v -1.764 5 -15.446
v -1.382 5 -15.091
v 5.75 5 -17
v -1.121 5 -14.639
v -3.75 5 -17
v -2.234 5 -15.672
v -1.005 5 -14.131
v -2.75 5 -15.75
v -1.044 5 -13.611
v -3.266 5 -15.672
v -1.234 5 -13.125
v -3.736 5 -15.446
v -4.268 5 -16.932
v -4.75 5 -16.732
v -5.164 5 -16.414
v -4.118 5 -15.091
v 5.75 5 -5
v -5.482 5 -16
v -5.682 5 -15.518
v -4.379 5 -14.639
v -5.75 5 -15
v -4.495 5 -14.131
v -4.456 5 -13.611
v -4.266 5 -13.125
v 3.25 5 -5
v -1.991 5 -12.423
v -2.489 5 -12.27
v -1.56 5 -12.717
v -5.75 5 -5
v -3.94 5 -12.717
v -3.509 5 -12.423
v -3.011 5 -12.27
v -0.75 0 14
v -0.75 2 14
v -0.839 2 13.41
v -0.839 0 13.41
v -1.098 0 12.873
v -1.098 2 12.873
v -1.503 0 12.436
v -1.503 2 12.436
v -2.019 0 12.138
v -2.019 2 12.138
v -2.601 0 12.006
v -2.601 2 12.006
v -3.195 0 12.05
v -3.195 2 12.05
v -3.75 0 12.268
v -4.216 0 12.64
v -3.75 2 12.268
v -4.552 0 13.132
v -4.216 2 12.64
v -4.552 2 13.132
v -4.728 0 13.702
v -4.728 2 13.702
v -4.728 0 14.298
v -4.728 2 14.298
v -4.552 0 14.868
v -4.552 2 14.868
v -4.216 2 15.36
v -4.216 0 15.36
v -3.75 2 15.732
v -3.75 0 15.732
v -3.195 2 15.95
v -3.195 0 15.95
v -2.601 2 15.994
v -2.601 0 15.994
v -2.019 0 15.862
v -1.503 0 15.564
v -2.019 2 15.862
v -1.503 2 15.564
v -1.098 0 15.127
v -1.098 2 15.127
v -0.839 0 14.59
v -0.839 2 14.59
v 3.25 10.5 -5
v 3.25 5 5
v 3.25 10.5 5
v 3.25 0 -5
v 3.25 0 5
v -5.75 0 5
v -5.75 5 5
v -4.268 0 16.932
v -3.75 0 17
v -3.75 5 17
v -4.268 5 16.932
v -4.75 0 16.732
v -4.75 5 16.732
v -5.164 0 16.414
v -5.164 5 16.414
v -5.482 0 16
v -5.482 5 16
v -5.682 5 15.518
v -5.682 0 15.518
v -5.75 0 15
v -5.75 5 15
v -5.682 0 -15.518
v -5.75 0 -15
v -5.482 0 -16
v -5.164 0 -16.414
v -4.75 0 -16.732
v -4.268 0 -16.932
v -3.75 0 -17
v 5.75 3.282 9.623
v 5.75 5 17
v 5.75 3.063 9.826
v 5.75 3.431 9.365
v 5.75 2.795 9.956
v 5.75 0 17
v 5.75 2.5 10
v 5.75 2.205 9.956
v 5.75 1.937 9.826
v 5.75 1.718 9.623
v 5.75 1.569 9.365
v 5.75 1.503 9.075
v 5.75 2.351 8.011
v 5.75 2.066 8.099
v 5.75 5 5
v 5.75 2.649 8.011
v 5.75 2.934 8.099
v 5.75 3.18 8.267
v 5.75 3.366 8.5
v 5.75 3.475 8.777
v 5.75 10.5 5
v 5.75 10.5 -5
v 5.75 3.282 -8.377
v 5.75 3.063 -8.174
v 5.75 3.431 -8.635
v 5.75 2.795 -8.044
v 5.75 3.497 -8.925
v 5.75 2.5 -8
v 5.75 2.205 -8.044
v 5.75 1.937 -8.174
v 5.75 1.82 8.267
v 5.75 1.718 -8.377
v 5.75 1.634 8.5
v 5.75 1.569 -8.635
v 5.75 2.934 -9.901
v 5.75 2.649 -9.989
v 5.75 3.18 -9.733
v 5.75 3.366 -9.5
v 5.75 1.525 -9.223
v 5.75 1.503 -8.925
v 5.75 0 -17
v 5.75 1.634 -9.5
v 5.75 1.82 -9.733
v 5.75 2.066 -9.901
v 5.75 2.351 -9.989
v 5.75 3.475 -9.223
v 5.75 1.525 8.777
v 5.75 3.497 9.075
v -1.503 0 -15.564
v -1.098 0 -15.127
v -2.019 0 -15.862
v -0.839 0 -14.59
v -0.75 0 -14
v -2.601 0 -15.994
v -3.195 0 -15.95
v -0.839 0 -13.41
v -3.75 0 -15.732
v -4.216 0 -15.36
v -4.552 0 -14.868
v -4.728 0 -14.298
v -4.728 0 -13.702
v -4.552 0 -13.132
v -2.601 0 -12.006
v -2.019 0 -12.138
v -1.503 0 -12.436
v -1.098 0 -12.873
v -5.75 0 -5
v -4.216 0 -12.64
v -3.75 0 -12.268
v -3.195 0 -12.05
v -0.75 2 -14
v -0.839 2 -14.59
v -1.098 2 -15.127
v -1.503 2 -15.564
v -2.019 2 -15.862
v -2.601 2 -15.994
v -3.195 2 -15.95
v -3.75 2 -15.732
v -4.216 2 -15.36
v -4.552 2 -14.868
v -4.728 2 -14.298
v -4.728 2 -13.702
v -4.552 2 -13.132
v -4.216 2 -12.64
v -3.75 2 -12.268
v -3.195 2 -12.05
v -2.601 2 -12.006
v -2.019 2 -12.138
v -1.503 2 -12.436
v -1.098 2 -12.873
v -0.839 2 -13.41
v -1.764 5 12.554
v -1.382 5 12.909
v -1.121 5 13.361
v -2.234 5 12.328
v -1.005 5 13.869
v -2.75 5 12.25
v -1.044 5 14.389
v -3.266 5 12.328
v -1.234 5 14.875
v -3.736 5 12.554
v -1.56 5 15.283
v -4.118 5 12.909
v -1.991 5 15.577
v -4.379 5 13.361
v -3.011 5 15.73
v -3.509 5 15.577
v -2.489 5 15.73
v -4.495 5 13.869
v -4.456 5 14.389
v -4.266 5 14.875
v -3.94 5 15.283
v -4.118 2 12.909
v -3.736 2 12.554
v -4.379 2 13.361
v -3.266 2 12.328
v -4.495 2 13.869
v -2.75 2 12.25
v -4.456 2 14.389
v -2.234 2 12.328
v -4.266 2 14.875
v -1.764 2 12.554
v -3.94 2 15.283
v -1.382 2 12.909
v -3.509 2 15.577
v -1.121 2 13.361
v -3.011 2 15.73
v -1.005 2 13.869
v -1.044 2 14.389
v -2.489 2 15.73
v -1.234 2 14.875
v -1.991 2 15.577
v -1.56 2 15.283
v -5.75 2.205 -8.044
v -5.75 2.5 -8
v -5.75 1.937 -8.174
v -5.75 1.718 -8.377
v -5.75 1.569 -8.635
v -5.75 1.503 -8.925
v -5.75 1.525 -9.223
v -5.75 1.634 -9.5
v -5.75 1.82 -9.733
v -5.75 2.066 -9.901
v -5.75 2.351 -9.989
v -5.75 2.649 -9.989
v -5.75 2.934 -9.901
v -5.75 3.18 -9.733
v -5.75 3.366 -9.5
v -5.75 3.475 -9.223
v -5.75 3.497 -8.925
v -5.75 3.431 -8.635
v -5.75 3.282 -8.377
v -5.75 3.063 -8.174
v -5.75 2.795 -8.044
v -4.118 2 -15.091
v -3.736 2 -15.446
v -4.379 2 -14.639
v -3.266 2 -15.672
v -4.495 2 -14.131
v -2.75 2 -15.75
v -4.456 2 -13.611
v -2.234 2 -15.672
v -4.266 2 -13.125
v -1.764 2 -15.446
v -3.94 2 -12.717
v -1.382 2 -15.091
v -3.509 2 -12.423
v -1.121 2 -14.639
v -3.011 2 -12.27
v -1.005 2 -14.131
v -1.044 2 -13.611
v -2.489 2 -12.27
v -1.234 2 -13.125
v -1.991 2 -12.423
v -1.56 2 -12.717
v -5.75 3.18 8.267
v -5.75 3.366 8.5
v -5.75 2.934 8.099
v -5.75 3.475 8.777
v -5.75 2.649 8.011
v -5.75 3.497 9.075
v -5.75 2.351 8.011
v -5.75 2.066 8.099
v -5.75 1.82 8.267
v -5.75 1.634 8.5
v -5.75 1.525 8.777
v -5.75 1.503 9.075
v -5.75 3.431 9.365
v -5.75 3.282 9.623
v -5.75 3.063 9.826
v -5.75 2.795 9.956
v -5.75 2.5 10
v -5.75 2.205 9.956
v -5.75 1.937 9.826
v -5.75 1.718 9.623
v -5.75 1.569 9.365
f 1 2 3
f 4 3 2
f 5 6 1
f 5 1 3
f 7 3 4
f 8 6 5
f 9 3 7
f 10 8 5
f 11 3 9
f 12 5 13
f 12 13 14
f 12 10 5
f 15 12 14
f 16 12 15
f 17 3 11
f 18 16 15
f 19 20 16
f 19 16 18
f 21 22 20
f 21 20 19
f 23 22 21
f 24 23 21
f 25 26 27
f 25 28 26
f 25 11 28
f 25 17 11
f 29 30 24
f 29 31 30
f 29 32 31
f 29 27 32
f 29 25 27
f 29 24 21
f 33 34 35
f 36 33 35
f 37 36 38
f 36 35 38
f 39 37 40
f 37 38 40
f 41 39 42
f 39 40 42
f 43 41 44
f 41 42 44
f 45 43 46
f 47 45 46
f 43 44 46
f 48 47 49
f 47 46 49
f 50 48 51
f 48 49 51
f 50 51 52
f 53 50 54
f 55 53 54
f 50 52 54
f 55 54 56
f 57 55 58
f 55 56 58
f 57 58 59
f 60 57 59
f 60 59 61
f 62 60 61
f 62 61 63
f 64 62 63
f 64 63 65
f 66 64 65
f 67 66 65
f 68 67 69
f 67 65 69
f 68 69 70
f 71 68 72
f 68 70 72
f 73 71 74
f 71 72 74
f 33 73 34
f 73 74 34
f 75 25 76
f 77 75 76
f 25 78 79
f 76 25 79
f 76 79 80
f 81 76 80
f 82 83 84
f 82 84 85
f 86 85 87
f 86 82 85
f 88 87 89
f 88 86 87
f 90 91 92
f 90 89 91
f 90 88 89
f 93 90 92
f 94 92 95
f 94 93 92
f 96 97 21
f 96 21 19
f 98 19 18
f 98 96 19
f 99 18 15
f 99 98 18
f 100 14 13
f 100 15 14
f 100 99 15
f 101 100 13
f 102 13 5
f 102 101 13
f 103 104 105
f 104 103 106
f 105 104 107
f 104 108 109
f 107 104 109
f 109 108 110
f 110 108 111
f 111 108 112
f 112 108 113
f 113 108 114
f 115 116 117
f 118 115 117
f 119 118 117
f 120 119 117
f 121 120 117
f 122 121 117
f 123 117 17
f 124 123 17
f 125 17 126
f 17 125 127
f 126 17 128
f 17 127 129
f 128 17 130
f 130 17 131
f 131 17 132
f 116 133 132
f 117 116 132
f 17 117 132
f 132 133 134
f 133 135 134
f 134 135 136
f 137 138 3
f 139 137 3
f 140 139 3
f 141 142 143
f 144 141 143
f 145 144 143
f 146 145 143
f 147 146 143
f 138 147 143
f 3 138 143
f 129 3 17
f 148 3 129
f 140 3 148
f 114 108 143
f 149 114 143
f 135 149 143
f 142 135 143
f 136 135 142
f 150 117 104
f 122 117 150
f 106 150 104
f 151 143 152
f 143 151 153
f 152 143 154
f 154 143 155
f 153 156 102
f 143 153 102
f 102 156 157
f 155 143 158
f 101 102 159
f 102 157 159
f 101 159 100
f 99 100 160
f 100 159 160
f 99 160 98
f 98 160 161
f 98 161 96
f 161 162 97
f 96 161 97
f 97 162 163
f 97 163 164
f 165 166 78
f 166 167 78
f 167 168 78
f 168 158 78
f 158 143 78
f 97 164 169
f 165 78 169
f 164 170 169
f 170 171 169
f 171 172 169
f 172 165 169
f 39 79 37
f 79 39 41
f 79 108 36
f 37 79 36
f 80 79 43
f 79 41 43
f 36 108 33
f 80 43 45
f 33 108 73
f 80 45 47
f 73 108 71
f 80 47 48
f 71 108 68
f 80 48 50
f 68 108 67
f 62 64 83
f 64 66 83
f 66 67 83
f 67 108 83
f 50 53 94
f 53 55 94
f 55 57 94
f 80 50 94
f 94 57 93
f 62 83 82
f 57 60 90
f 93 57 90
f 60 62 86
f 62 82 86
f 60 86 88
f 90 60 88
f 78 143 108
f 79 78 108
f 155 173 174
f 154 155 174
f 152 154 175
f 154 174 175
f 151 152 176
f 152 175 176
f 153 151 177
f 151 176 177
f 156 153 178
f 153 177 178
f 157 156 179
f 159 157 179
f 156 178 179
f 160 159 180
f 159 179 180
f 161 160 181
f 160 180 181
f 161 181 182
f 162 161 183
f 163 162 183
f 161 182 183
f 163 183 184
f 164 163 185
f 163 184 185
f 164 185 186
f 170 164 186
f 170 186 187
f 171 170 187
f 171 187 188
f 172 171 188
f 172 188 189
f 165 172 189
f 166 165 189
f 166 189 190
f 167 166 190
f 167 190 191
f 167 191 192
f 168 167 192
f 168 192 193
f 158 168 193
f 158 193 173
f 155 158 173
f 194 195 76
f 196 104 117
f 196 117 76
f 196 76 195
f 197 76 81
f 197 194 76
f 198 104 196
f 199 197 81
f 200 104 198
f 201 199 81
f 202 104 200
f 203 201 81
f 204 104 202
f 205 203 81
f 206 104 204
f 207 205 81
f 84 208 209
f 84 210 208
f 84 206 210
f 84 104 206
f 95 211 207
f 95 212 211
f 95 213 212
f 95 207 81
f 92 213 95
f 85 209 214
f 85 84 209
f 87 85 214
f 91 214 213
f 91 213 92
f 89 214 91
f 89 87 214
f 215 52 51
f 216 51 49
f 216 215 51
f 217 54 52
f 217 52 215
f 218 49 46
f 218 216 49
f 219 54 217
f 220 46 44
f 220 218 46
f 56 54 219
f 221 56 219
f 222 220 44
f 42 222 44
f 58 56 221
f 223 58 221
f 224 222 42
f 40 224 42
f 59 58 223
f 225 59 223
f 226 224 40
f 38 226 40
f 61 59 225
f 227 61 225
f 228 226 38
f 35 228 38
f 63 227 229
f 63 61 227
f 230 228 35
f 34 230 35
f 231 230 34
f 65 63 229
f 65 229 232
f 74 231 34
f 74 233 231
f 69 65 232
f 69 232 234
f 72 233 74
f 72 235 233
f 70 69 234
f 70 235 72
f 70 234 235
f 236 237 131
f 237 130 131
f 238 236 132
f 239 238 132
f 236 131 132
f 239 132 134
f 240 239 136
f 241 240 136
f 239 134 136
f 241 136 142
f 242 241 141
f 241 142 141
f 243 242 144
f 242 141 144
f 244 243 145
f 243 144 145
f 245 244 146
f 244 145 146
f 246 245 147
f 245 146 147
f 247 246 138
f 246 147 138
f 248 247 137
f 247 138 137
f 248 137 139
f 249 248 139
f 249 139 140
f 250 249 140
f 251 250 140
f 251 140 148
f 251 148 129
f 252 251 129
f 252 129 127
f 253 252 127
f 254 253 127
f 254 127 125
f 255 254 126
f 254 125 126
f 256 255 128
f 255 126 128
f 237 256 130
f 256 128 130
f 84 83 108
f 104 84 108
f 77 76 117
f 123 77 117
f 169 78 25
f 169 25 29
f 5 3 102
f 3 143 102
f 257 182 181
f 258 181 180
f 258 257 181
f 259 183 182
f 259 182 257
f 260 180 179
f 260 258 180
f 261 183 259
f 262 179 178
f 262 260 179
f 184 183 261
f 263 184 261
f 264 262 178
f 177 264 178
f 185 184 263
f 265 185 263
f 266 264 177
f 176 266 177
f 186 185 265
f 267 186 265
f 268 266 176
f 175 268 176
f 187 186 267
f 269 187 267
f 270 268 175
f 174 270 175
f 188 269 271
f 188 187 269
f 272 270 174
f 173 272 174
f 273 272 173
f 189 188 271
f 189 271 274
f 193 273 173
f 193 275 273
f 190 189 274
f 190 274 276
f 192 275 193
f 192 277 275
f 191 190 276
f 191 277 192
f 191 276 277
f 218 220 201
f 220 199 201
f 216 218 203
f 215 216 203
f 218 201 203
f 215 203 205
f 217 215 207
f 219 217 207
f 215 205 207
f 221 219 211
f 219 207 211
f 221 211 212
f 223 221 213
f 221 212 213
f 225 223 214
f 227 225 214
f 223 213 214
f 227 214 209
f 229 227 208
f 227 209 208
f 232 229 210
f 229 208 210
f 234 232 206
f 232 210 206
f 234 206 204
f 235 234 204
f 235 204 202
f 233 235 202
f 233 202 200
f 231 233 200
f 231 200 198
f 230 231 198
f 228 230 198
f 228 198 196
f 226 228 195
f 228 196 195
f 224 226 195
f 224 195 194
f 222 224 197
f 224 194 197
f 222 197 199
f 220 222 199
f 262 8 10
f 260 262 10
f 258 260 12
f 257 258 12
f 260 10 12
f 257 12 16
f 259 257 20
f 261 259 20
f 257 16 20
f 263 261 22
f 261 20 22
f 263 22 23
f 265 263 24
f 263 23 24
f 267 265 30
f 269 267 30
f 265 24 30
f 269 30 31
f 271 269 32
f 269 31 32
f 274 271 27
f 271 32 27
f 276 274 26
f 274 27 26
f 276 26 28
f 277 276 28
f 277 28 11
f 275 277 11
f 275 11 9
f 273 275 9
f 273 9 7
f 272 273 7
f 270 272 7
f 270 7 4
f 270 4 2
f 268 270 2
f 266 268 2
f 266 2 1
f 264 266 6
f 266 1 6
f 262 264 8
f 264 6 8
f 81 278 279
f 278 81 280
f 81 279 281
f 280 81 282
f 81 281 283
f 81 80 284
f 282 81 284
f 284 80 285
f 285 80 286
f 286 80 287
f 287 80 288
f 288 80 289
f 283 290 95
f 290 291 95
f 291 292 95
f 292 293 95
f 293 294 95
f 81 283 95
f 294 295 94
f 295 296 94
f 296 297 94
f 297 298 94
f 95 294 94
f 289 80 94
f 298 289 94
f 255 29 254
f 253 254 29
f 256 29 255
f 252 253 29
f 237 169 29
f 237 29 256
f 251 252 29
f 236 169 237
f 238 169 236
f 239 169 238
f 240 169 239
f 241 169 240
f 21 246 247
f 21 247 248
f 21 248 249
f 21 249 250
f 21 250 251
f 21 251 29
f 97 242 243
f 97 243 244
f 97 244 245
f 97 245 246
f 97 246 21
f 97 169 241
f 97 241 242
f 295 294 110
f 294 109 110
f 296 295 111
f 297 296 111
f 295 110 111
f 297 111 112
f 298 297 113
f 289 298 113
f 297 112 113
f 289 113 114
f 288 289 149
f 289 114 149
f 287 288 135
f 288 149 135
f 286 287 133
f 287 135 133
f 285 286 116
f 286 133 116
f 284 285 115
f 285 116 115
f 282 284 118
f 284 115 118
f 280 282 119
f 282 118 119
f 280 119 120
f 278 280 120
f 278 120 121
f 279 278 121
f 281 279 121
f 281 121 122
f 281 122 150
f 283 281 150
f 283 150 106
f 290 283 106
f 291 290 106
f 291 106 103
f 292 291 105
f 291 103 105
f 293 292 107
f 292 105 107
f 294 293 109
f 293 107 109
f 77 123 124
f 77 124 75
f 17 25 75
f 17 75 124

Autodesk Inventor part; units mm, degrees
ref_plane "YZ Plane" through (0, 0, 0) normal (1, 0, 0) x (0, 1, 0)
ref_plane "XZ Plane" through (0, 0, 0) normal (0, 1, 0) x (-1, 0, 0)
sketch "Sketch1" plane through (0, 0, 0) normal (0, 1, 0) x (-1, 0, 0)
  line L0 (3.75, 17) -> (-5.75, 17)
  line L1 (-5.75, 17) -> (-5.75, -17)
  line L2 (-5.75, -17) -> (3.75, -17)
  line L3 (5.75, 17) -> (-5.75, -17) construction
  line L4 (-5.75, 17) -> (5.75, -17) construction
  arc A0 (5.75, 15) -> (3.75, 17) centre (3.75, 15) ccw
  arc A1 (3.75, -17) -> (5.75, -15) centre (3.75, -15) ccw
  line L5 (-3.25, 0) -> (-3.25, 5)
  line L6 (-3.25, 0) -> (-3.25, -5)
  line L7 (-3.25, -5) -> (5.75, -5)
  line L8 (-3.25, 5) -> (5.75, 5)
  line L9 (5.75, 5) -> (5.75, 15)
  line L10 (5.75, -5) -> (5.75, -15)
  arc A2 (-0.5666, 5) -> (-0.5666, -5) centre (2.75, 0) ccw
  line L11 (-3.25, 5) -> (-5.75, 5)
  line L12 (-3.25, -5) -> (-5.75, -5)
  point P0 (2.75, 14)
  point P1 (2.75, -14)
  dimension "d0" = 11.5
  dimension "d1" = 34
  dimension "d2" = 2
  dimension "d29" = 5
  dimension "d30" = 5
  dimension "d31" = 9
  dimension "d32" = 9
  dimension "d48" = 8.5
extrude "Extrusion1" add sketch "Sketch1" along normal blind 5 contours A0 L9 L8 L11 L1 L0 | L11 L5 L6 L12 L1 | L12 L7 L10 A1 L2 L1
hole "Hole1" at (-2.75, 0, 14) at (-2.75, 0, -14) direction (0, 1, 0) diameter 3.5 depth 8
sketch "Sketch5" plane through (-5.75, 0, 5) normal (-1, 0, 0) x (0, 0, 1)
  point P0 (-5, 0)
  point P1 (4, 2.5)
  point P2 (-14, 2.5)
hole "Hole3" at (-5.75, 2.5, 9) at (-5.75, 2.5, -9) direction (1, 0, 0) diameter 2 depth 12
extrude "Extrusion4" add sketch "Sketch1" along normal blind 10.5 contours L11 L5 L6 L12 L1
ref_plane "Work Plane4" through (0, 2, 0) normal (0, -1, 0) x (1, 0, 0)
sketch "Sketch9" plane through (0, 2, 0) normal (0, -1, 0) x (1, 0, 0)
  circle A0 centre (-2.75, -14) radius 1.75 projected
  circle A1 centre (-2.75, 14) radius 1.75 projected
  circle A2 centre (-2.75, 14) radius 2
  circle A3 centre (-2.75, -14) radius 2
  point P0 (0, 0)
  dimension "d61" = 4
  dimension "d62" = 4
extrude "Extrusion7" cut sketch "Sketch9" along normal blind 10
properties part number "togh" material "ABS Plastic"
